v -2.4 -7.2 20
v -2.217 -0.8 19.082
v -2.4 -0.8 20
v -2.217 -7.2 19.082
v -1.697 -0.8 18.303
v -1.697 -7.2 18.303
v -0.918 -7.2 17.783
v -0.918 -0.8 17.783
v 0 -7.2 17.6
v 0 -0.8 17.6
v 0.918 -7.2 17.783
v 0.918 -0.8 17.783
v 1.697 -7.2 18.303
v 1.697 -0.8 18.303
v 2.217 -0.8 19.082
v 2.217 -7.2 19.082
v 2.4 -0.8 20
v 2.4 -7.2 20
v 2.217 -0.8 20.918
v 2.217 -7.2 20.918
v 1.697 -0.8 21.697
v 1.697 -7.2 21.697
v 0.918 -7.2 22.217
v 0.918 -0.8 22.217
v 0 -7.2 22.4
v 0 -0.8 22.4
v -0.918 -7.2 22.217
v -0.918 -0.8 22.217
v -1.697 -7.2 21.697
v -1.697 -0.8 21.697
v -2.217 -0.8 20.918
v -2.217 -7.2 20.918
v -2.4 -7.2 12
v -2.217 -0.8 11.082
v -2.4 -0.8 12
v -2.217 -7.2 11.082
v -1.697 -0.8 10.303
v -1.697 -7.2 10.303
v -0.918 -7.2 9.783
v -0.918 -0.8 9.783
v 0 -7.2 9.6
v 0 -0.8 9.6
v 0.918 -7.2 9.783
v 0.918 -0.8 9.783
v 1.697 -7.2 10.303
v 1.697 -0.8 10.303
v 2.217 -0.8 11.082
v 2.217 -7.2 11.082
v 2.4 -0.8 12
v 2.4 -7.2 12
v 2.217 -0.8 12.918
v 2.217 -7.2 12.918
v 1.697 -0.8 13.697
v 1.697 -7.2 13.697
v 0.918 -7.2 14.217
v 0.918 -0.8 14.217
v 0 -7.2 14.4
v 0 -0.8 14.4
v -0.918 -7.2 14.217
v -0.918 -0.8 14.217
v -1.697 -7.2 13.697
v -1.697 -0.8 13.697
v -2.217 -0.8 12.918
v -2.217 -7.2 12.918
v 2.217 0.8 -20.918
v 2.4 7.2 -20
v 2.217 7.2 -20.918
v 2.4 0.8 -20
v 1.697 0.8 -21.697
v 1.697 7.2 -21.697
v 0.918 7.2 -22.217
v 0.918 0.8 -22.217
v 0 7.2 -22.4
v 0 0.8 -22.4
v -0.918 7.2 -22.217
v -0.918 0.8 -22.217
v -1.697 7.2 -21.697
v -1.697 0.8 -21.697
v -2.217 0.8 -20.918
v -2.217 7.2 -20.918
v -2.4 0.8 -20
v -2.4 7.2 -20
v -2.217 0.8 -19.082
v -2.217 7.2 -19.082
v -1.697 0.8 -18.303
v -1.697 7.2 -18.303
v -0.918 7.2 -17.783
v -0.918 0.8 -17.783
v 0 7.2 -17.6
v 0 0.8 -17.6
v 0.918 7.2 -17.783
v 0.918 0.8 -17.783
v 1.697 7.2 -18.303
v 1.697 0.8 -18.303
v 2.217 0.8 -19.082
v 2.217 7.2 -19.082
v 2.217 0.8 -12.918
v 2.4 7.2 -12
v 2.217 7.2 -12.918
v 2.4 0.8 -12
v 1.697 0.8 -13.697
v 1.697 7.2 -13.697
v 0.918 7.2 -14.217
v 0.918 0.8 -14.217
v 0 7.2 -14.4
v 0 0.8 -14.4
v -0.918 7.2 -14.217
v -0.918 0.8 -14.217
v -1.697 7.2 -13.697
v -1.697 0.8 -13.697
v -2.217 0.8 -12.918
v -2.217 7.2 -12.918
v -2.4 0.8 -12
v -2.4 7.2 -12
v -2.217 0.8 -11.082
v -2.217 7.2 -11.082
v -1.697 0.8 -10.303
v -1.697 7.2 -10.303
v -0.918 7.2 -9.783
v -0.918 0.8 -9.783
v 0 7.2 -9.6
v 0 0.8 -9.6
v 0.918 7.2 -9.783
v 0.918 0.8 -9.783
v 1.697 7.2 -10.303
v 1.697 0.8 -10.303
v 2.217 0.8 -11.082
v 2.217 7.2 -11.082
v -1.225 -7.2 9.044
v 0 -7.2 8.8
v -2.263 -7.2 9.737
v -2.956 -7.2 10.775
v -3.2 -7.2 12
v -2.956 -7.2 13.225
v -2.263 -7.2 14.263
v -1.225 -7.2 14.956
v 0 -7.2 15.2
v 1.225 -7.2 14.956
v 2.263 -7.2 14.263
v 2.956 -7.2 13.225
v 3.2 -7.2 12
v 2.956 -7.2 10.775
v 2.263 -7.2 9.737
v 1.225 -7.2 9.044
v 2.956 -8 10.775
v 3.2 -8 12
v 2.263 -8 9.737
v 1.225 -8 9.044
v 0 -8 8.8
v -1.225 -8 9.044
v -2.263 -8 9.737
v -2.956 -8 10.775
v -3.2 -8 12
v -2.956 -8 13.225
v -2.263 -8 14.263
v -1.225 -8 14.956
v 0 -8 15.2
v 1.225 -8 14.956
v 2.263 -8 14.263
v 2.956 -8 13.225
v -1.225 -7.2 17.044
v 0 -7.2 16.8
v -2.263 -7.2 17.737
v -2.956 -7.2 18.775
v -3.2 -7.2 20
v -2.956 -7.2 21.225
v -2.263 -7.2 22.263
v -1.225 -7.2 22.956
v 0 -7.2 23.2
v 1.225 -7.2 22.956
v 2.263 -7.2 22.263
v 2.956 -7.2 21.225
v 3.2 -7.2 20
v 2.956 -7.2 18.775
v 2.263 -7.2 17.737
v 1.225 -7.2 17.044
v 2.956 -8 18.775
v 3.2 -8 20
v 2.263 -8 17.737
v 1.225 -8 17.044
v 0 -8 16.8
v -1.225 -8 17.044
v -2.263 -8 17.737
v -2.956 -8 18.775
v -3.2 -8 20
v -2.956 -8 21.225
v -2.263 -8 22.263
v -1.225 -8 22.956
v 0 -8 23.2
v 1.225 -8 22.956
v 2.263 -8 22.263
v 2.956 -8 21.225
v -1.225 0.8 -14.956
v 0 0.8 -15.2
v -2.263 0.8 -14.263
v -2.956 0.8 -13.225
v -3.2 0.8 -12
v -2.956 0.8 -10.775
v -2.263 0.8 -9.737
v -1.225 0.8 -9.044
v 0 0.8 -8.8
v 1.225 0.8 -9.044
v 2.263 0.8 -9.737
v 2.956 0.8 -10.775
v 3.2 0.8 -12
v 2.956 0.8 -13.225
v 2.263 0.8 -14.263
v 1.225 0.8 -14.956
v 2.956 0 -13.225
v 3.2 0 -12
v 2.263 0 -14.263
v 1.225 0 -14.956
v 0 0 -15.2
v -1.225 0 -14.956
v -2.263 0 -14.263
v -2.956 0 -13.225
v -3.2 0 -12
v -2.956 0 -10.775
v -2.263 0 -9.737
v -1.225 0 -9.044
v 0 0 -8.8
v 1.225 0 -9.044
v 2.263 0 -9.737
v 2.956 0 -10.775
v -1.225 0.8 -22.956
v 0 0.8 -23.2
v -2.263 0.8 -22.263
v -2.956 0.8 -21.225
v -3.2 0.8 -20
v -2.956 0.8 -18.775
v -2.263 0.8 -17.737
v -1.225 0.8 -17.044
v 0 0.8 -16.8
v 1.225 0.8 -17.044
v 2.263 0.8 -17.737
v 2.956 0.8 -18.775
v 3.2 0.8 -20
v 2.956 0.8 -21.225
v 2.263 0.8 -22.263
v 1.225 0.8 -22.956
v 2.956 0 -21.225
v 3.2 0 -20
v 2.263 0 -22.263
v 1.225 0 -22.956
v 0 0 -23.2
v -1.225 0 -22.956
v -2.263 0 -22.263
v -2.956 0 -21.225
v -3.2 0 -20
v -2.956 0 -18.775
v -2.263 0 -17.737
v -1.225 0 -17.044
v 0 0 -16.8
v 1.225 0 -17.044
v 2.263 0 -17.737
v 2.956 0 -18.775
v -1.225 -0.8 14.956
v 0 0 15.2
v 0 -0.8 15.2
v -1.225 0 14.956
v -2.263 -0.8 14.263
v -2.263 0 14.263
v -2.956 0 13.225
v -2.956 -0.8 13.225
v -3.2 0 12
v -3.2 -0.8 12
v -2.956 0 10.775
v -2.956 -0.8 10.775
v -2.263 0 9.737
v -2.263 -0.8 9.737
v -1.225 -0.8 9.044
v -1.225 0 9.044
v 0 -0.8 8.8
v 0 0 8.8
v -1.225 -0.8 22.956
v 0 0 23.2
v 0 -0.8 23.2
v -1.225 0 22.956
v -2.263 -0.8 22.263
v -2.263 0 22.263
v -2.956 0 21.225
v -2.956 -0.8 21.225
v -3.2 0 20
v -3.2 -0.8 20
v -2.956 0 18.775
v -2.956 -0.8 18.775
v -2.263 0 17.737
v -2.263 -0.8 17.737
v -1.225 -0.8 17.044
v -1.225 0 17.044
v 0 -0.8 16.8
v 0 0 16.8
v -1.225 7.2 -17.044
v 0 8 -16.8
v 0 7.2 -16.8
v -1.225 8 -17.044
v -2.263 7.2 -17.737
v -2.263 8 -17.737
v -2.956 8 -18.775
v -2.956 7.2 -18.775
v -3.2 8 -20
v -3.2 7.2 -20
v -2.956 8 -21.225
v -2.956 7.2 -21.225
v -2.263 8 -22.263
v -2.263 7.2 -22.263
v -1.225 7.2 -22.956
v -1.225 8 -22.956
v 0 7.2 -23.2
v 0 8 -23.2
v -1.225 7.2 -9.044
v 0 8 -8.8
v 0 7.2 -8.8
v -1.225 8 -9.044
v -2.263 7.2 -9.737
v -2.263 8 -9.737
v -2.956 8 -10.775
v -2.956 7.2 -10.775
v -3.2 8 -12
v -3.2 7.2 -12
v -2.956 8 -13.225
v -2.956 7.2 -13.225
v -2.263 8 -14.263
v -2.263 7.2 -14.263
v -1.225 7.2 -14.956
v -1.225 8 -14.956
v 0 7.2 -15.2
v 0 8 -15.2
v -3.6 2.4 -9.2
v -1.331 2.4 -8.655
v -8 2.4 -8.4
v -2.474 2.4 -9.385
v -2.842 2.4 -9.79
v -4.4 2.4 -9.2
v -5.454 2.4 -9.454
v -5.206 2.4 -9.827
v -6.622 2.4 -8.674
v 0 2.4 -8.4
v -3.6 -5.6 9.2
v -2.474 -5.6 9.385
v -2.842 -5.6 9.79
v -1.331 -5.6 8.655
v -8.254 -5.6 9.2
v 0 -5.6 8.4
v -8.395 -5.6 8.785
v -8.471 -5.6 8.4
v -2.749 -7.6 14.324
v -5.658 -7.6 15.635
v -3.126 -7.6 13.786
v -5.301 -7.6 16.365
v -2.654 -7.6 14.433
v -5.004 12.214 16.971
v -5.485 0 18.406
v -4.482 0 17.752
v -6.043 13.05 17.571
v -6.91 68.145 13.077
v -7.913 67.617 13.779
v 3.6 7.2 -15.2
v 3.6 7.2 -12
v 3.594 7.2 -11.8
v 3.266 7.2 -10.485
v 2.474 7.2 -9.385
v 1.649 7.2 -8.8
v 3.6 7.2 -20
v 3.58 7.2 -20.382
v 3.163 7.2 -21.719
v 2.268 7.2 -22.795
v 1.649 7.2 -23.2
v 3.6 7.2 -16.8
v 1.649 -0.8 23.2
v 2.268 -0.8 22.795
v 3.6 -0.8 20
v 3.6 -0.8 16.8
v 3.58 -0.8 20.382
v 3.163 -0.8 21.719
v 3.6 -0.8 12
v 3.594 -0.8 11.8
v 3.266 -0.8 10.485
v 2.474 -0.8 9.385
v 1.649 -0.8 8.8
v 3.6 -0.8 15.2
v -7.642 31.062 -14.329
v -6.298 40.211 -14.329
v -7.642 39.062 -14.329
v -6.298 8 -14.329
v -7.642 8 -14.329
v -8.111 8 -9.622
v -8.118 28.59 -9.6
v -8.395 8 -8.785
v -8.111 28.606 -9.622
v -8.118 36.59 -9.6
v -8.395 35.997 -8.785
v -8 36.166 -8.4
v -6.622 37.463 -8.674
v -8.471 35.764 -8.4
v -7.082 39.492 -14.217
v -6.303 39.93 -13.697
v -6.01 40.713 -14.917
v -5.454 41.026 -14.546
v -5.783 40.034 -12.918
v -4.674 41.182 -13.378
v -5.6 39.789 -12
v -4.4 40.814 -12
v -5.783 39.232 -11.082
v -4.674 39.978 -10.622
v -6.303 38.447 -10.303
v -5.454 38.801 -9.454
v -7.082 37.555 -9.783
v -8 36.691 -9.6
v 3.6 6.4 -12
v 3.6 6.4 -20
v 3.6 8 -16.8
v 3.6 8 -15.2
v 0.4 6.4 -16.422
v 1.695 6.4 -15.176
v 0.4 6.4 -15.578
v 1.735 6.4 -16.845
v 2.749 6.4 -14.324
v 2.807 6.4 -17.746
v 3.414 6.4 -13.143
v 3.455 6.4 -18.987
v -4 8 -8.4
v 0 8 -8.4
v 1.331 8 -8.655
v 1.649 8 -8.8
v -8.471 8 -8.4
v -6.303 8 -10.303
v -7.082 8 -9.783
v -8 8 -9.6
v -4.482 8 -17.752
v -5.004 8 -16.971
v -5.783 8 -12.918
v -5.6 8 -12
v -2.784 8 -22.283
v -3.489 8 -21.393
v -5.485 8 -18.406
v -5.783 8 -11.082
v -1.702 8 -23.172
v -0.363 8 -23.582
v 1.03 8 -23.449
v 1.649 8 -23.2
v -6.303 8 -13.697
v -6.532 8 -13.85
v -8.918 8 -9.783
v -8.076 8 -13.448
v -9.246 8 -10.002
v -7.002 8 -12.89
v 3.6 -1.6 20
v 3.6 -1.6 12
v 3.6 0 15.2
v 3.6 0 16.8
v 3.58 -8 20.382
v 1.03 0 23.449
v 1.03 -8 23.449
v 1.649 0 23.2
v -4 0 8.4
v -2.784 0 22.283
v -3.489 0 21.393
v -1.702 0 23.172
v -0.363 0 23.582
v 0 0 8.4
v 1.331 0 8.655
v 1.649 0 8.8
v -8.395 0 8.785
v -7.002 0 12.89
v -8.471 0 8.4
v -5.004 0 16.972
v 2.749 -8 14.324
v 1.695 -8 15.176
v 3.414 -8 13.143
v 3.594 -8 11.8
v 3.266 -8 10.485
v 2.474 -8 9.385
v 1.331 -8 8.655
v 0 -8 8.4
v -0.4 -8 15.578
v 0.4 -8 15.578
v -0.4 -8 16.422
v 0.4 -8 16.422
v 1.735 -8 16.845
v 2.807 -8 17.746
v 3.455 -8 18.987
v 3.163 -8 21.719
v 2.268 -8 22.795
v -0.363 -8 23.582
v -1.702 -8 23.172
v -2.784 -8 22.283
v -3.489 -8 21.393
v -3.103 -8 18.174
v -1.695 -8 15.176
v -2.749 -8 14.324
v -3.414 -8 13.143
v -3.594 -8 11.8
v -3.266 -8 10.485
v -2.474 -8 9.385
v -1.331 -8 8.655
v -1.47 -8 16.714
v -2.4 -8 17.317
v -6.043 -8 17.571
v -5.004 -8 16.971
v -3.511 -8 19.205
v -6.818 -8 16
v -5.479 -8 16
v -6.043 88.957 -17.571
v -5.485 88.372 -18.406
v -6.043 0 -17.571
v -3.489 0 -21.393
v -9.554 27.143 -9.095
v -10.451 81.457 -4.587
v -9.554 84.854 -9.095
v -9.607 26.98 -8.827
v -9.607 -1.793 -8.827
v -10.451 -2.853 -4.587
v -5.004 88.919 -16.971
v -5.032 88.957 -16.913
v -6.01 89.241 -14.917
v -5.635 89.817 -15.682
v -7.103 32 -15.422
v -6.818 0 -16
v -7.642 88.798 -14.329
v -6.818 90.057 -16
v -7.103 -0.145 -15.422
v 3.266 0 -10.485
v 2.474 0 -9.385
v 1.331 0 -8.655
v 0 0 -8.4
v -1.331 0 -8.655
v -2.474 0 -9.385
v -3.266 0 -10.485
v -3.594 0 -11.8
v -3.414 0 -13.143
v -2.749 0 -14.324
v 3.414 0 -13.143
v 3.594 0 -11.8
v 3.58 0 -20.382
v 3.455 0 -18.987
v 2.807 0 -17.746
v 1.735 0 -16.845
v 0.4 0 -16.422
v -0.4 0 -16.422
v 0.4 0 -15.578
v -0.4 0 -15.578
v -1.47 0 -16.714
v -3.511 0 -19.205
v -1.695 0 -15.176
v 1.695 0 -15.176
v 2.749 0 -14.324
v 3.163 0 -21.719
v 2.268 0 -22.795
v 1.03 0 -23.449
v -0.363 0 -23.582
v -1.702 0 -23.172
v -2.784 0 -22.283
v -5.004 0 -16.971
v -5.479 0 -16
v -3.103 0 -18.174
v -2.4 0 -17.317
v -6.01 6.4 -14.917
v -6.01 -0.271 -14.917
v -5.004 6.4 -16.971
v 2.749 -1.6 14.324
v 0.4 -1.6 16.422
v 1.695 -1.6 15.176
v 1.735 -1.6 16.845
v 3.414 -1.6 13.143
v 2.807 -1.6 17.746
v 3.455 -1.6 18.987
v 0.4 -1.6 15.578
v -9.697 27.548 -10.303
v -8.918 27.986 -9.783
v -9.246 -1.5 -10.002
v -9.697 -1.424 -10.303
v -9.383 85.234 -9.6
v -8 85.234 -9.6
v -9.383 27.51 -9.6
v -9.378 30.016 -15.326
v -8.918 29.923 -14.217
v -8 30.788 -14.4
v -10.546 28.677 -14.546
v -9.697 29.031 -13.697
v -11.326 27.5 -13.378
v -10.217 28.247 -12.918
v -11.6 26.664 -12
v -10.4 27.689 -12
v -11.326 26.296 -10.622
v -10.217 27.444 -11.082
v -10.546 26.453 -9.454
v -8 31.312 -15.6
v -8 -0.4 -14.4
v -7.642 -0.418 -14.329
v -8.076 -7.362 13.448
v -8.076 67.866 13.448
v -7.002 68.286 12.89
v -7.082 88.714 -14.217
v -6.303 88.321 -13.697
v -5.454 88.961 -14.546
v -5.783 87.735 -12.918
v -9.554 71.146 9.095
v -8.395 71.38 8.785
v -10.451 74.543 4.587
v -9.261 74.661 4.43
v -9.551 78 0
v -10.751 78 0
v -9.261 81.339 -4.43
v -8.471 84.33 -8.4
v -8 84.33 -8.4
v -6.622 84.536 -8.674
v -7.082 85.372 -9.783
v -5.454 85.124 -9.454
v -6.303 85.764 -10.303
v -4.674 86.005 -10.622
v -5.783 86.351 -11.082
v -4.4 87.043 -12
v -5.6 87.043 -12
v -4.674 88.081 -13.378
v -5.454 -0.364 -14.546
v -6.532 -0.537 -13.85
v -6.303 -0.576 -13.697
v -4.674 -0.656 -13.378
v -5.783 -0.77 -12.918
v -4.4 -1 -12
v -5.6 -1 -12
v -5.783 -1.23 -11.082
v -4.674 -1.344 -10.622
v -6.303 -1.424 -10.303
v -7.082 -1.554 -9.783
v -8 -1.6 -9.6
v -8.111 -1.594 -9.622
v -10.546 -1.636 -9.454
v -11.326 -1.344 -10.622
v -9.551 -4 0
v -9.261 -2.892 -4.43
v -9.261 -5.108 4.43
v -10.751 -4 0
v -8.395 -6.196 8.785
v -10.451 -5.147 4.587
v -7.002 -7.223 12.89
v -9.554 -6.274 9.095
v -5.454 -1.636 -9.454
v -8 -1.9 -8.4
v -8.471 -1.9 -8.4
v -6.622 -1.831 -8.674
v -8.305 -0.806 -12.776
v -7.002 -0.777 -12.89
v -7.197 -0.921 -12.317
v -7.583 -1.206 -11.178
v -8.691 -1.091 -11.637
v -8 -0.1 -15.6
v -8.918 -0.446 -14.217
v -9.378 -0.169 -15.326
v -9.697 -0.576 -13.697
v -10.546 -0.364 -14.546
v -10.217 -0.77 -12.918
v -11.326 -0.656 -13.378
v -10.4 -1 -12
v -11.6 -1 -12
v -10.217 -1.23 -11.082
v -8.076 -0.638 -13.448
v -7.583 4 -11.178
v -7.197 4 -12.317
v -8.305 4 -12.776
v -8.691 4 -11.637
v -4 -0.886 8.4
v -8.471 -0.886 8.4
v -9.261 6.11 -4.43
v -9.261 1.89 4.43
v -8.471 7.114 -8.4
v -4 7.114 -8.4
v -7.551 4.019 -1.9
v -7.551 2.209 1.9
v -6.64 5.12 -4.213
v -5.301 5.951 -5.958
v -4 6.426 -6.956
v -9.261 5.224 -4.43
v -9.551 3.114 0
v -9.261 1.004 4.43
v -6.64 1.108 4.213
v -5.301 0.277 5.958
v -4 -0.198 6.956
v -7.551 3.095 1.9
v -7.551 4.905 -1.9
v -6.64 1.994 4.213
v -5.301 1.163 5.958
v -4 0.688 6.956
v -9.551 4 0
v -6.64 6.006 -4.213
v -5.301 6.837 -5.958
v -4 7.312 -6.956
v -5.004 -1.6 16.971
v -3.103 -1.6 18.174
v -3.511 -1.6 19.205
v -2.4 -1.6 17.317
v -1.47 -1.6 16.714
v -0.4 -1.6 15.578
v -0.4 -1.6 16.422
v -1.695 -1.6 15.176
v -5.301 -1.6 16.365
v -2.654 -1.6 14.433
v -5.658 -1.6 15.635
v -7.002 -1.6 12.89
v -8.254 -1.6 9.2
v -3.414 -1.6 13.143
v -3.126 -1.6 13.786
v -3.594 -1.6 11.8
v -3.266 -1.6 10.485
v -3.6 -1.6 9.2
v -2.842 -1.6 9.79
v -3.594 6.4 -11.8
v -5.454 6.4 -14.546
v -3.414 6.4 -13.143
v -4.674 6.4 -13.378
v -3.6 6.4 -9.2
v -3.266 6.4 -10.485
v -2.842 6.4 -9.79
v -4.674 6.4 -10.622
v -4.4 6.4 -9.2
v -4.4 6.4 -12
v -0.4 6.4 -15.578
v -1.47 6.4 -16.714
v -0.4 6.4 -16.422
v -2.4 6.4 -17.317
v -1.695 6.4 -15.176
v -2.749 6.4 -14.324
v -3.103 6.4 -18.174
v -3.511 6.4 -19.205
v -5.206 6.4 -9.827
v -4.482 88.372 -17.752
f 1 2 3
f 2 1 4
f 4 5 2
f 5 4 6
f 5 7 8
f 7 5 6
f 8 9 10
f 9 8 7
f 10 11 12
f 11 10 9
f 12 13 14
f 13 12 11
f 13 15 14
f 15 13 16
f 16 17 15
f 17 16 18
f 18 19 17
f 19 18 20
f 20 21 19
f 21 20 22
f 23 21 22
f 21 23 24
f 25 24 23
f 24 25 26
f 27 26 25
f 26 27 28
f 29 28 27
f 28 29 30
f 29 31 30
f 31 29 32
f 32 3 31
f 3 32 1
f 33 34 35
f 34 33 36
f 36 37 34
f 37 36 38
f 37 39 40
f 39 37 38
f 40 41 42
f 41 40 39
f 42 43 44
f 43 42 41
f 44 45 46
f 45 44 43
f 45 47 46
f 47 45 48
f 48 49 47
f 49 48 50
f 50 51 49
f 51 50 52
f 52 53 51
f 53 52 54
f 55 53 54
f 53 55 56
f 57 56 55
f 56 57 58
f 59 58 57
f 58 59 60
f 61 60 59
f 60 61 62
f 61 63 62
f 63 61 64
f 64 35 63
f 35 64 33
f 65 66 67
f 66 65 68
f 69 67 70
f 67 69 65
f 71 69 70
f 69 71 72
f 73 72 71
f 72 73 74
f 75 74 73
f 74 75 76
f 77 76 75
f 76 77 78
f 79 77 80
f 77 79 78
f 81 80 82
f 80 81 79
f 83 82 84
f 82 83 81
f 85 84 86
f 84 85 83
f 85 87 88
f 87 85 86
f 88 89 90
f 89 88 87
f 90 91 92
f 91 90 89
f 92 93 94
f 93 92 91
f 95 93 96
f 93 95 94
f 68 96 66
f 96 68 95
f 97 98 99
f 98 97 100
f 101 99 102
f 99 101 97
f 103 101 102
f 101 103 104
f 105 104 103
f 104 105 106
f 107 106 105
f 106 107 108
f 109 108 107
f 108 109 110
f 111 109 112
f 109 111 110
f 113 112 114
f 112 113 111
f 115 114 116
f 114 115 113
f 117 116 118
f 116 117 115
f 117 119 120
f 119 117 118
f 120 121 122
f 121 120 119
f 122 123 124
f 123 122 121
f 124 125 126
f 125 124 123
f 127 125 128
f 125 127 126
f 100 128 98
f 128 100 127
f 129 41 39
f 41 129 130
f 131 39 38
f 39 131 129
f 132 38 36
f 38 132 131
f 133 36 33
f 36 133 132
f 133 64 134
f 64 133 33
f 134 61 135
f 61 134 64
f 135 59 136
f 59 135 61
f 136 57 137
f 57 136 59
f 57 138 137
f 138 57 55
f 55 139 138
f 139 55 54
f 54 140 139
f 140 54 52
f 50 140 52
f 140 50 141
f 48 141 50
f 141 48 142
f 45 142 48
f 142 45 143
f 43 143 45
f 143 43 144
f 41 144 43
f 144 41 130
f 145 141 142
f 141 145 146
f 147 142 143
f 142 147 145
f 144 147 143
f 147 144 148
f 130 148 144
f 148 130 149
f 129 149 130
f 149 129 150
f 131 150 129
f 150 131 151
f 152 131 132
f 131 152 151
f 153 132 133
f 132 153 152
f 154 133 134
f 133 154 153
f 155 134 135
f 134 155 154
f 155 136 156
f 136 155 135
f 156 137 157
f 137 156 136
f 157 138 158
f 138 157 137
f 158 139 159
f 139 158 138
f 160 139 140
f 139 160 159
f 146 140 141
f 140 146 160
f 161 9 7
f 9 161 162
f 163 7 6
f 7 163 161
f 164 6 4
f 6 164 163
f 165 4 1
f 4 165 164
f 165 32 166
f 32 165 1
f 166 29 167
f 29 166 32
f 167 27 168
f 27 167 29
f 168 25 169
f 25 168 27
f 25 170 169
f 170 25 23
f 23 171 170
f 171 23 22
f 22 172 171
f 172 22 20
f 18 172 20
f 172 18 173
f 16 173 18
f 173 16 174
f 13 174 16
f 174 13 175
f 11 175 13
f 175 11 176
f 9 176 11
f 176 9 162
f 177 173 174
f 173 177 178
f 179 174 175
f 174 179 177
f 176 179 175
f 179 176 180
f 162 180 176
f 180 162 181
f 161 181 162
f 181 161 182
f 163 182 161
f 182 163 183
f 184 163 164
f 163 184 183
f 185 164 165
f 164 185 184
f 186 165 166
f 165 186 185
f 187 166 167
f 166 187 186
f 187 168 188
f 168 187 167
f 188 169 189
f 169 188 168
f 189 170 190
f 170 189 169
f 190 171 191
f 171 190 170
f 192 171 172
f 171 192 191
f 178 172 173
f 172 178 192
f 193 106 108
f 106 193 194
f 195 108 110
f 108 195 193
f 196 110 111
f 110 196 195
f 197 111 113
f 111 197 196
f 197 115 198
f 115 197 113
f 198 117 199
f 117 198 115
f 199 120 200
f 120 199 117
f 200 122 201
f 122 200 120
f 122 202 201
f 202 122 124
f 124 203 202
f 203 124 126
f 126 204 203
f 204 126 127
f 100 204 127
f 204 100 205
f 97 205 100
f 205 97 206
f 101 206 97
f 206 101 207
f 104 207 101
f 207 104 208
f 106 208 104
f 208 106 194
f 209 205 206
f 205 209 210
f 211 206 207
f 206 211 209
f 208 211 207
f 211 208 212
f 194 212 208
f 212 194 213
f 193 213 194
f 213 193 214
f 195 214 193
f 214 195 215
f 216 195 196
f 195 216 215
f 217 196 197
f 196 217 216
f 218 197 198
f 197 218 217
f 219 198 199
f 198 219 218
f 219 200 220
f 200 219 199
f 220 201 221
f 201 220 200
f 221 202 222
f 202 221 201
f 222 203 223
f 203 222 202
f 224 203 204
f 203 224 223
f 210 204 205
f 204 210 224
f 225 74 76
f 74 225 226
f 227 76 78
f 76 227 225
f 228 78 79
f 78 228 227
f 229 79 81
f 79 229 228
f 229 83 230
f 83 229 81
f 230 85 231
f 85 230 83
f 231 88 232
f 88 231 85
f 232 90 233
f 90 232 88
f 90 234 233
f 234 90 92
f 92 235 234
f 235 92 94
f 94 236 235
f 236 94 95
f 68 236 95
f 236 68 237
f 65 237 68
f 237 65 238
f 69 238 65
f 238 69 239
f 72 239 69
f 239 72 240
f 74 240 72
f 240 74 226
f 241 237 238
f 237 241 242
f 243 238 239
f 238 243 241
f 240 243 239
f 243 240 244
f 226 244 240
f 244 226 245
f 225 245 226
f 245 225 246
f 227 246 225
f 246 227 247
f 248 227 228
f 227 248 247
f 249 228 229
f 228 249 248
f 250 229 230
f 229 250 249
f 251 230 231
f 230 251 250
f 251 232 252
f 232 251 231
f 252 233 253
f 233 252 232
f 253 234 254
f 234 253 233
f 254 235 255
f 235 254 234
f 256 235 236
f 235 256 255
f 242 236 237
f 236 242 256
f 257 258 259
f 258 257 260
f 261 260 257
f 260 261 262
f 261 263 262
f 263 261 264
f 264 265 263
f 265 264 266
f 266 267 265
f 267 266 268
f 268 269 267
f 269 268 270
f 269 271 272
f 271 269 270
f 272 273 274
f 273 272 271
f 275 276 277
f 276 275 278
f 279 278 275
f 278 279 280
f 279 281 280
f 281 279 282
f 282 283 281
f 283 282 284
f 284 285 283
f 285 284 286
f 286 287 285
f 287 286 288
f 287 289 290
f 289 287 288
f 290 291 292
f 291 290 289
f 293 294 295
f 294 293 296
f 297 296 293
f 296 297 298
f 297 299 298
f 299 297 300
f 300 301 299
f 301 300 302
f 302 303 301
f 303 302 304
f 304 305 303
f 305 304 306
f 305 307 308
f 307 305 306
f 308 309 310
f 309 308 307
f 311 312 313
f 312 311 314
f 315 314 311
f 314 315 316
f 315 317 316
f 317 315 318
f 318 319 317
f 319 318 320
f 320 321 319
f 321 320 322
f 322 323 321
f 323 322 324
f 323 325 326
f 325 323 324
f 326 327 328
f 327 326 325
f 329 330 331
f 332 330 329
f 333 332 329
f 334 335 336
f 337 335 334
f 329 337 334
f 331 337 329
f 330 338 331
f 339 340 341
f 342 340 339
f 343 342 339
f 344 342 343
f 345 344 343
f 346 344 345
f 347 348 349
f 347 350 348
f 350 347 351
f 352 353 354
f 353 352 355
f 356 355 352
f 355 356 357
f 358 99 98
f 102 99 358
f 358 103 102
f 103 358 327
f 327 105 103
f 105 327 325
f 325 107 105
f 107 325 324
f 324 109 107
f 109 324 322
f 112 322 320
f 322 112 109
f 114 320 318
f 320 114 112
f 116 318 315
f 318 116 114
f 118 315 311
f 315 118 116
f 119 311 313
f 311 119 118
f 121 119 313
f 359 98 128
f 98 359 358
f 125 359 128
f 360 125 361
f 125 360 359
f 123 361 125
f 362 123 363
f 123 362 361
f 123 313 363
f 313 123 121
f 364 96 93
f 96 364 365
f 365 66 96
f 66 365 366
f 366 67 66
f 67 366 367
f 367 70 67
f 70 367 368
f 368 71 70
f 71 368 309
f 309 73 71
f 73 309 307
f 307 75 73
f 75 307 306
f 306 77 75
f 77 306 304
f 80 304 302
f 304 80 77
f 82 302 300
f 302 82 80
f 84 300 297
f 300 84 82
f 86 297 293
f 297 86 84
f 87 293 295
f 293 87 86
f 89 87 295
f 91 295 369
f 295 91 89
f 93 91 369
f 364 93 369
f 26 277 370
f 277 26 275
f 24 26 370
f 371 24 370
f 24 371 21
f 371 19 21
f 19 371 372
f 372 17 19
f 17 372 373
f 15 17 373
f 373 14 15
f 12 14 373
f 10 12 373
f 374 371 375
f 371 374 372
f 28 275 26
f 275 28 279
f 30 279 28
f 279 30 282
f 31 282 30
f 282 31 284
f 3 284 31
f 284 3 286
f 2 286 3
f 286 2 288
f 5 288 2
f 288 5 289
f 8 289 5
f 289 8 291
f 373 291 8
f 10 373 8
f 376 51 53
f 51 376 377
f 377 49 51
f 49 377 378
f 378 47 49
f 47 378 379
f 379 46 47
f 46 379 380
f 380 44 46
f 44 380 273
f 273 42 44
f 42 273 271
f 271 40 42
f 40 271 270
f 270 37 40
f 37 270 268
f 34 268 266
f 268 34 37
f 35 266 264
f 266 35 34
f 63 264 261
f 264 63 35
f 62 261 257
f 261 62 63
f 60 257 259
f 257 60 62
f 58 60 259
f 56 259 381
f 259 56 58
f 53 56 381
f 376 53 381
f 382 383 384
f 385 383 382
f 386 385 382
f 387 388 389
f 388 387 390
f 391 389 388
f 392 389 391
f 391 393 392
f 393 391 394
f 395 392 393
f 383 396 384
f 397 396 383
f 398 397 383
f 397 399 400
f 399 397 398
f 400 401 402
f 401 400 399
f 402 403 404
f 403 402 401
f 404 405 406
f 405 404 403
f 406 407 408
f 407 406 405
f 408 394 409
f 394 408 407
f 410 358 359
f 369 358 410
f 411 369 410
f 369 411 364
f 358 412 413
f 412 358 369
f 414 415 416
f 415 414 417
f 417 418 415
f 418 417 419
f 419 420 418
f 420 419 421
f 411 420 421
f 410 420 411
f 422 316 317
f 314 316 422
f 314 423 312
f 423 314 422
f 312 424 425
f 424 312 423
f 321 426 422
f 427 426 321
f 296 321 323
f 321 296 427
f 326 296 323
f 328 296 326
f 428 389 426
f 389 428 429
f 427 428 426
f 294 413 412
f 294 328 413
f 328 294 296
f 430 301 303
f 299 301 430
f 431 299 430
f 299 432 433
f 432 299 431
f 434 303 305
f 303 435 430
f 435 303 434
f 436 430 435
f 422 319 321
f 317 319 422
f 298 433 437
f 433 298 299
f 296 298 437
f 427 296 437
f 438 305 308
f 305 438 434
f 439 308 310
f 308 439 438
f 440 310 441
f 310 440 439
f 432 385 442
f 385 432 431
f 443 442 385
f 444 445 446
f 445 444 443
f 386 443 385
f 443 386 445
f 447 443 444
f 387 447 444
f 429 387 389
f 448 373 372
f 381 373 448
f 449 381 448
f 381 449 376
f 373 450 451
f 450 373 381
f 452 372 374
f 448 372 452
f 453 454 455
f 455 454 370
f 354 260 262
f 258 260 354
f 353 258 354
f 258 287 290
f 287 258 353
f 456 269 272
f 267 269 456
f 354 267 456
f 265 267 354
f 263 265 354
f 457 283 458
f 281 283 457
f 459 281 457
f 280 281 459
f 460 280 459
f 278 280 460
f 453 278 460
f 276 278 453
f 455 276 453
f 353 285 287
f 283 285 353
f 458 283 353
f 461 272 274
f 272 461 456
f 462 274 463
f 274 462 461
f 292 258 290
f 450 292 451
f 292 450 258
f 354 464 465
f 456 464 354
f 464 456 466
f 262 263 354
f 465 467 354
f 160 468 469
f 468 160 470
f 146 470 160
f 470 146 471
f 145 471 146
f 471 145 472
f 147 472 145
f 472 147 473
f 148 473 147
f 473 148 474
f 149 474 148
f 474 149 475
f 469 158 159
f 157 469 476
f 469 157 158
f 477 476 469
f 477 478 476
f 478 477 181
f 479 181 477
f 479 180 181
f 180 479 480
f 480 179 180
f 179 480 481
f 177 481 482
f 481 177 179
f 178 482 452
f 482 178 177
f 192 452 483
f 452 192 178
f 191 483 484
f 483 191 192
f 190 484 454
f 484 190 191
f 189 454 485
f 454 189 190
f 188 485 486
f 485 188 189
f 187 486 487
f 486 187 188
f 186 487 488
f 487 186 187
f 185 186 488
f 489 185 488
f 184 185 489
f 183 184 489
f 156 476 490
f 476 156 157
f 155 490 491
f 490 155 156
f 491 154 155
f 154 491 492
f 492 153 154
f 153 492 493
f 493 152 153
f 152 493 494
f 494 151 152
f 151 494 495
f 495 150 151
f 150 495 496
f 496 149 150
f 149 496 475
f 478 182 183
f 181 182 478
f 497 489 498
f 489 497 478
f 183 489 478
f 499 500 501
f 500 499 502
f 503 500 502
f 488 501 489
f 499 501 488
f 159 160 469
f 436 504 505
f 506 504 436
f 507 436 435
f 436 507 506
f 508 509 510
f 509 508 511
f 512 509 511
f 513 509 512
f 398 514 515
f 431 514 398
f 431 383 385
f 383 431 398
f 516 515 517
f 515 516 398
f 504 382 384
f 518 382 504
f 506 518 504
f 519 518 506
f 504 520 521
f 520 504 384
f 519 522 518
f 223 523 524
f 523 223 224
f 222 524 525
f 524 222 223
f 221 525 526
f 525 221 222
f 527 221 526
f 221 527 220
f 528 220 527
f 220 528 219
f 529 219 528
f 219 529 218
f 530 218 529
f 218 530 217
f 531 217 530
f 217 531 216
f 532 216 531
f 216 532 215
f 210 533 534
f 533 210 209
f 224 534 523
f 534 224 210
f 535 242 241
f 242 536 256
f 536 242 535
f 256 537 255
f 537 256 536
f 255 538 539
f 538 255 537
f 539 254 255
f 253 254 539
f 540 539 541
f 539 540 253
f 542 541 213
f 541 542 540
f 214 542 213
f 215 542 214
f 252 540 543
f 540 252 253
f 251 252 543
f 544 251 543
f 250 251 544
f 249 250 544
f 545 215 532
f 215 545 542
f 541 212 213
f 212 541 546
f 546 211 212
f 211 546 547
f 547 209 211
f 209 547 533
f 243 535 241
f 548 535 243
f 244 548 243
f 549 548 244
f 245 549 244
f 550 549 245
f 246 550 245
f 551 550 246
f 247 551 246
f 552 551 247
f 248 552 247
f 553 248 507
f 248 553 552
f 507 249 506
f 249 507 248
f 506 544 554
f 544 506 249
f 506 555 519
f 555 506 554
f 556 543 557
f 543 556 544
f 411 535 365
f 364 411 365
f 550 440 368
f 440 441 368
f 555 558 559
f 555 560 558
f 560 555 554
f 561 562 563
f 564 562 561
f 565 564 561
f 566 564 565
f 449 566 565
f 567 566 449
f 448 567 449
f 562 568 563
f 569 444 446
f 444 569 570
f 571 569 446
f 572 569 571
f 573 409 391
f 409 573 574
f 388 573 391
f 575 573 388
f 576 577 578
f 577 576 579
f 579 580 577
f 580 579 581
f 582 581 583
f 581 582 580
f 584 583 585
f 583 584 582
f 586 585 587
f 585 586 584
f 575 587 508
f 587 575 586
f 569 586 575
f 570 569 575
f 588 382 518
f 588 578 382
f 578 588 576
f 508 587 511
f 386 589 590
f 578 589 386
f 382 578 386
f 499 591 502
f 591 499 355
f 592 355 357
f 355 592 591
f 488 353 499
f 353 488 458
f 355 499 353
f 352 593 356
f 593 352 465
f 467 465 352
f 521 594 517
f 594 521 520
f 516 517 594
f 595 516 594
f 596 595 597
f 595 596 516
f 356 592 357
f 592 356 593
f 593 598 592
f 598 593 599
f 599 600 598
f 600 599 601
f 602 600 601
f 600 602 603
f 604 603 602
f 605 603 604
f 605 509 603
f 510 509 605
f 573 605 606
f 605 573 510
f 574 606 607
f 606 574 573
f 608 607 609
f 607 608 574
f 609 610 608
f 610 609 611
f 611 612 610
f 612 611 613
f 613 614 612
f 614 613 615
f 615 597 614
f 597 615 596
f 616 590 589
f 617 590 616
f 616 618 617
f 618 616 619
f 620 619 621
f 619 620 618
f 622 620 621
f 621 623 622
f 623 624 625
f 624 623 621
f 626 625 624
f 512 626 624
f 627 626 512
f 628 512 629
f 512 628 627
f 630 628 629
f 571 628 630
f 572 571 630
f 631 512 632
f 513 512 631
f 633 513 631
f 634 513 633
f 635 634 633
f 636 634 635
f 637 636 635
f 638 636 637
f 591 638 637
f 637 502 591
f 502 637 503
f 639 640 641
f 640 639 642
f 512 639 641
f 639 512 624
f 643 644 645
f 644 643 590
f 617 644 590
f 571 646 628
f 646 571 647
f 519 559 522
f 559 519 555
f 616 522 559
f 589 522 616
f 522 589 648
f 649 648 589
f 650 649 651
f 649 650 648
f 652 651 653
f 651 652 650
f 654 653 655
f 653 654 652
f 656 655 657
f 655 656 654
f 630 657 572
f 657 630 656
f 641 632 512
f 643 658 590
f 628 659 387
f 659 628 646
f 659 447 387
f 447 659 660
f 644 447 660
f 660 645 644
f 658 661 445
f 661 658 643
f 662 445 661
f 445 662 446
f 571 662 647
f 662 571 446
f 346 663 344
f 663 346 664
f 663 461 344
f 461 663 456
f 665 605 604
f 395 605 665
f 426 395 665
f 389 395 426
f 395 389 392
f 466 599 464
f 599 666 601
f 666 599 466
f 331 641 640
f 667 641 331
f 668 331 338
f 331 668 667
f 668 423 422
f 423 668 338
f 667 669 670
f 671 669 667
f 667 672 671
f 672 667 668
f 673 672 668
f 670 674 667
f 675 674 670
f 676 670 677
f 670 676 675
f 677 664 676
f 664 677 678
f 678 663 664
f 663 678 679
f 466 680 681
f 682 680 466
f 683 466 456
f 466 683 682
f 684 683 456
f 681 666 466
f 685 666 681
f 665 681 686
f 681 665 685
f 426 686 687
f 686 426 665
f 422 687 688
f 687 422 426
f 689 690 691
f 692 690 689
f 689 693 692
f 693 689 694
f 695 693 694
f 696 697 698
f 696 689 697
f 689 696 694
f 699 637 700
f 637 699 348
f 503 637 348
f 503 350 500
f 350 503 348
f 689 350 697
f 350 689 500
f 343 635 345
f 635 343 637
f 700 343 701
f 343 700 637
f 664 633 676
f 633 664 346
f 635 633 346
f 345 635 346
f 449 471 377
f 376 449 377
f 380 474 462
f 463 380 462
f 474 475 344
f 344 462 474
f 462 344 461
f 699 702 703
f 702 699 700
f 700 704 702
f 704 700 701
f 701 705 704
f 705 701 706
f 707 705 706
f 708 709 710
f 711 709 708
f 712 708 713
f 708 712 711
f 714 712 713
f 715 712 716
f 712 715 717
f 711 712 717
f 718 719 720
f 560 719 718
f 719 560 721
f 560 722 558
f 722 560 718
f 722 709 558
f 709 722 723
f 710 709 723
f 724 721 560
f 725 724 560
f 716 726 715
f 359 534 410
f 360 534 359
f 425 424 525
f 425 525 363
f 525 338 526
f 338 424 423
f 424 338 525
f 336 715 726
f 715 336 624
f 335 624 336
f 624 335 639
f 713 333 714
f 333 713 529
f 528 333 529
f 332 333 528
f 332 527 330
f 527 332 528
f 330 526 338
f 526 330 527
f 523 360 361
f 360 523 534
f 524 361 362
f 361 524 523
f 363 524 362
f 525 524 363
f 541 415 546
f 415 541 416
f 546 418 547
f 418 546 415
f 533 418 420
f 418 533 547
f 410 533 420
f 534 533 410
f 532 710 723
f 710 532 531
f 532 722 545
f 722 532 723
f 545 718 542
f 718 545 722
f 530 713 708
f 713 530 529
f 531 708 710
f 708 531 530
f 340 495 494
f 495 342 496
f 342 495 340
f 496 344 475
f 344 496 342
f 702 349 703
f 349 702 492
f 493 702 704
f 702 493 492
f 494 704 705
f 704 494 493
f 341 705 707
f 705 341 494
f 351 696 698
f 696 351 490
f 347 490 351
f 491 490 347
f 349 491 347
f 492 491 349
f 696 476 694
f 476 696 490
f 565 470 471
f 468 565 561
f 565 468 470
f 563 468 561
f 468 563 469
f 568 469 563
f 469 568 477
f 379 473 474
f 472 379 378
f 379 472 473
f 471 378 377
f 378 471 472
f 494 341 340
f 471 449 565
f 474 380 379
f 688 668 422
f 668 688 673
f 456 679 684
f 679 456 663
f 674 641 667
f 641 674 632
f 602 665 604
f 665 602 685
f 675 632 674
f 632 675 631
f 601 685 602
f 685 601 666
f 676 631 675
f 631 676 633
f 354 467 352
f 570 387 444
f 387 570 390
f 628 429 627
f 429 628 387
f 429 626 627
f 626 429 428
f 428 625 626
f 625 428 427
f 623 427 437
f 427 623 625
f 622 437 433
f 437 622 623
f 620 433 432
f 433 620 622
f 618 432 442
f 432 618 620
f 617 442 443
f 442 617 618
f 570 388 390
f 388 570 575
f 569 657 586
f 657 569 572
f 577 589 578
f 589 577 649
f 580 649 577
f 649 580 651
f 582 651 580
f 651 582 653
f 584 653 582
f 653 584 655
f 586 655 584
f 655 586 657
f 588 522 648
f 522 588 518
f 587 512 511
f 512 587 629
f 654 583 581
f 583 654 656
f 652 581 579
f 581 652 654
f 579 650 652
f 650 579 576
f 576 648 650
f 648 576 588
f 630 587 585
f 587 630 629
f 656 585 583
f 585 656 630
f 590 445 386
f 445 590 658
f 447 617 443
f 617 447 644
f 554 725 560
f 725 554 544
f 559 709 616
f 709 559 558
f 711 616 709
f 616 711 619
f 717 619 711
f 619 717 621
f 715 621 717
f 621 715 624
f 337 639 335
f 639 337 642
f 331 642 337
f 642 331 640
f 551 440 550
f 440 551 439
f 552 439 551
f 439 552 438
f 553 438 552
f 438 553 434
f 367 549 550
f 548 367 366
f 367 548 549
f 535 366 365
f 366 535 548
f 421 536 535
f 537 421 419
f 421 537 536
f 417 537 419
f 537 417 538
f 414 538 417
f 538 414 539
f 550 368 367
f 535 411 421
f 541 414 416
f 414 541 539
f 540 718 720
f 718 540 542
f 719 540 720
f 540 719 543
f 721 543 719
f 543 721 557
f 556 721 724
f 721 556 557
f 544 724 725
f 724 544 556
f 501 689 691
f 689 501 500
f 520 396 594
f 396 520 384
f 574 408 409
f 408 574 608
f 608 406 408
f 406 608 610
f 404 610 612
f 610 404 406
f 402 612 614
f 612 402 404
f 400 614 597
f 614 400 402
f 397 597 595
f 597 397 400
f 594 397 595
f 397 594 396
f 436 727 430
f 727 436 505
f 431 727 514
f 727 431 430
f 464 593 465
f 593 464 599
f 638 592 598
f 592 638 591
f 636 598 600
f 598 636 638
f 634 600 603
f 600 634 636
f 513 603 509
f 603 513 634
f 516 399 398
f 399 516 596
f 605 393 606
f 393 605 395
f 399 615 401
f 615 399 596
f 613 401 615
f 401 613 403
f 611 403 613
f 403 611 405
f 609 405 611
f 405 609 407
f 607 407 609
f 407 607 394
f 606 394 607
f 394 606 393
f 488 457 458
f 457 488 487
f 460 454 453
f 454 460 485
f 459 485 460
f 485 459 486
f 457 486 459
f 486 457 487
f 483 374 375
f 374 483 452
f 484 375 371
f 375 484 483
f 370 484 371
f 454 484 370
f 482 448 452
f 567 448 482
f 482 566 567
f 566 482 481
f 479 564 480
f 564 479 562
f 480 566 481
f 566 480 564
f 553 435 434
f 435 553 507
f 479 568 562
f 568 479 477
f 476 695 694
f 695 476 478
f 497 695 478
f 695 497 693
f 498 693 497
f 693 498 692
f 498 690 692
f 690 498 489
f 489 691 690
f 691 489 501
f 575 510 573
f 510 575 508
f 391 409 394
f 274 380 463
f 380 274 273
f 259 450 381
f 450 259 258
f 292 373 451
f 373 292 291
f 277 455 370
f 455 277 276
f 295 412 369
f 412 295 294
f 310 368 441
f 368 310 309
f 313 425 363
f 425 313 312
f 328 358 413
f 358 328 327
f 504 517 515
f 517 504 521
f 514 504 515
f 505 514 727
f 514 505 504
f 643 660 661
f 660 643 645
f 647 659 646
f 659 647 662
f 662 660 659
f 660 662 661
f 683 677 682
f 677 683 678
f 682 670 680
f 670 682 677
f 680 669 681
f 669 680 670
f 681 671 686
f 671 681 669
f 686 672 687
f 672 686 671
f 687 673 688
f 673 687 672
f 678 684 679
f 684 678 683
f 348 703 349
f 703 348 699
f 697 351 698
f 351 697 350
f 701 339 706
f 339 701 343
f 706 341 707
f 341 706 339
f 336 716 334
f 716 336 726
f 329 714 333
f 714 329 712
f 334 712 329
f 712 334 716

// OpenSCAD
use <../lib.scad>
use <44351.scad>
$fa=1; $fs=0.2;
function ldraw_lib__44350(realsolid=false) = [
// 0 Technic Panel Fairing #20
// 0 Name: 44350.dat
// 0 Author: Marc Klein [marckl]
// 0 !LDRAW_ORG Part UPDATE 2009-03
// 0 !LICENSE Licensed under CC BY 2.0 and CC BY 4.0 : see CAreadme.txt
// 
// 0 BFC CERTIFY CCW
  [0,"BFC","CERTIFY"],
  [0,"BFC","CCW"],
// 
// 0 !HISTORY 2009-12-29 [PTadmin] Official Update 2009-03
// 
// 
// 1 16 0 0 0 -1 0 0 0 1 0 0 0 1 44351.dat
  [1,16,0,0,0,-1,0,0,0,1,0,0,0,1, ldraw_lib__44351(realsolid)],
// 0
];
module ldraw_lib__44350(step=0, col=false, unit=2/5, alt=false, line=0.2, solid=!$preview)
    makepoly(ldraw_lib__44350(solid), step=step, col=col, unit=unit, alt=alt, line=line, solid=solid);
ldraw_lib__44350(line=0.2);
